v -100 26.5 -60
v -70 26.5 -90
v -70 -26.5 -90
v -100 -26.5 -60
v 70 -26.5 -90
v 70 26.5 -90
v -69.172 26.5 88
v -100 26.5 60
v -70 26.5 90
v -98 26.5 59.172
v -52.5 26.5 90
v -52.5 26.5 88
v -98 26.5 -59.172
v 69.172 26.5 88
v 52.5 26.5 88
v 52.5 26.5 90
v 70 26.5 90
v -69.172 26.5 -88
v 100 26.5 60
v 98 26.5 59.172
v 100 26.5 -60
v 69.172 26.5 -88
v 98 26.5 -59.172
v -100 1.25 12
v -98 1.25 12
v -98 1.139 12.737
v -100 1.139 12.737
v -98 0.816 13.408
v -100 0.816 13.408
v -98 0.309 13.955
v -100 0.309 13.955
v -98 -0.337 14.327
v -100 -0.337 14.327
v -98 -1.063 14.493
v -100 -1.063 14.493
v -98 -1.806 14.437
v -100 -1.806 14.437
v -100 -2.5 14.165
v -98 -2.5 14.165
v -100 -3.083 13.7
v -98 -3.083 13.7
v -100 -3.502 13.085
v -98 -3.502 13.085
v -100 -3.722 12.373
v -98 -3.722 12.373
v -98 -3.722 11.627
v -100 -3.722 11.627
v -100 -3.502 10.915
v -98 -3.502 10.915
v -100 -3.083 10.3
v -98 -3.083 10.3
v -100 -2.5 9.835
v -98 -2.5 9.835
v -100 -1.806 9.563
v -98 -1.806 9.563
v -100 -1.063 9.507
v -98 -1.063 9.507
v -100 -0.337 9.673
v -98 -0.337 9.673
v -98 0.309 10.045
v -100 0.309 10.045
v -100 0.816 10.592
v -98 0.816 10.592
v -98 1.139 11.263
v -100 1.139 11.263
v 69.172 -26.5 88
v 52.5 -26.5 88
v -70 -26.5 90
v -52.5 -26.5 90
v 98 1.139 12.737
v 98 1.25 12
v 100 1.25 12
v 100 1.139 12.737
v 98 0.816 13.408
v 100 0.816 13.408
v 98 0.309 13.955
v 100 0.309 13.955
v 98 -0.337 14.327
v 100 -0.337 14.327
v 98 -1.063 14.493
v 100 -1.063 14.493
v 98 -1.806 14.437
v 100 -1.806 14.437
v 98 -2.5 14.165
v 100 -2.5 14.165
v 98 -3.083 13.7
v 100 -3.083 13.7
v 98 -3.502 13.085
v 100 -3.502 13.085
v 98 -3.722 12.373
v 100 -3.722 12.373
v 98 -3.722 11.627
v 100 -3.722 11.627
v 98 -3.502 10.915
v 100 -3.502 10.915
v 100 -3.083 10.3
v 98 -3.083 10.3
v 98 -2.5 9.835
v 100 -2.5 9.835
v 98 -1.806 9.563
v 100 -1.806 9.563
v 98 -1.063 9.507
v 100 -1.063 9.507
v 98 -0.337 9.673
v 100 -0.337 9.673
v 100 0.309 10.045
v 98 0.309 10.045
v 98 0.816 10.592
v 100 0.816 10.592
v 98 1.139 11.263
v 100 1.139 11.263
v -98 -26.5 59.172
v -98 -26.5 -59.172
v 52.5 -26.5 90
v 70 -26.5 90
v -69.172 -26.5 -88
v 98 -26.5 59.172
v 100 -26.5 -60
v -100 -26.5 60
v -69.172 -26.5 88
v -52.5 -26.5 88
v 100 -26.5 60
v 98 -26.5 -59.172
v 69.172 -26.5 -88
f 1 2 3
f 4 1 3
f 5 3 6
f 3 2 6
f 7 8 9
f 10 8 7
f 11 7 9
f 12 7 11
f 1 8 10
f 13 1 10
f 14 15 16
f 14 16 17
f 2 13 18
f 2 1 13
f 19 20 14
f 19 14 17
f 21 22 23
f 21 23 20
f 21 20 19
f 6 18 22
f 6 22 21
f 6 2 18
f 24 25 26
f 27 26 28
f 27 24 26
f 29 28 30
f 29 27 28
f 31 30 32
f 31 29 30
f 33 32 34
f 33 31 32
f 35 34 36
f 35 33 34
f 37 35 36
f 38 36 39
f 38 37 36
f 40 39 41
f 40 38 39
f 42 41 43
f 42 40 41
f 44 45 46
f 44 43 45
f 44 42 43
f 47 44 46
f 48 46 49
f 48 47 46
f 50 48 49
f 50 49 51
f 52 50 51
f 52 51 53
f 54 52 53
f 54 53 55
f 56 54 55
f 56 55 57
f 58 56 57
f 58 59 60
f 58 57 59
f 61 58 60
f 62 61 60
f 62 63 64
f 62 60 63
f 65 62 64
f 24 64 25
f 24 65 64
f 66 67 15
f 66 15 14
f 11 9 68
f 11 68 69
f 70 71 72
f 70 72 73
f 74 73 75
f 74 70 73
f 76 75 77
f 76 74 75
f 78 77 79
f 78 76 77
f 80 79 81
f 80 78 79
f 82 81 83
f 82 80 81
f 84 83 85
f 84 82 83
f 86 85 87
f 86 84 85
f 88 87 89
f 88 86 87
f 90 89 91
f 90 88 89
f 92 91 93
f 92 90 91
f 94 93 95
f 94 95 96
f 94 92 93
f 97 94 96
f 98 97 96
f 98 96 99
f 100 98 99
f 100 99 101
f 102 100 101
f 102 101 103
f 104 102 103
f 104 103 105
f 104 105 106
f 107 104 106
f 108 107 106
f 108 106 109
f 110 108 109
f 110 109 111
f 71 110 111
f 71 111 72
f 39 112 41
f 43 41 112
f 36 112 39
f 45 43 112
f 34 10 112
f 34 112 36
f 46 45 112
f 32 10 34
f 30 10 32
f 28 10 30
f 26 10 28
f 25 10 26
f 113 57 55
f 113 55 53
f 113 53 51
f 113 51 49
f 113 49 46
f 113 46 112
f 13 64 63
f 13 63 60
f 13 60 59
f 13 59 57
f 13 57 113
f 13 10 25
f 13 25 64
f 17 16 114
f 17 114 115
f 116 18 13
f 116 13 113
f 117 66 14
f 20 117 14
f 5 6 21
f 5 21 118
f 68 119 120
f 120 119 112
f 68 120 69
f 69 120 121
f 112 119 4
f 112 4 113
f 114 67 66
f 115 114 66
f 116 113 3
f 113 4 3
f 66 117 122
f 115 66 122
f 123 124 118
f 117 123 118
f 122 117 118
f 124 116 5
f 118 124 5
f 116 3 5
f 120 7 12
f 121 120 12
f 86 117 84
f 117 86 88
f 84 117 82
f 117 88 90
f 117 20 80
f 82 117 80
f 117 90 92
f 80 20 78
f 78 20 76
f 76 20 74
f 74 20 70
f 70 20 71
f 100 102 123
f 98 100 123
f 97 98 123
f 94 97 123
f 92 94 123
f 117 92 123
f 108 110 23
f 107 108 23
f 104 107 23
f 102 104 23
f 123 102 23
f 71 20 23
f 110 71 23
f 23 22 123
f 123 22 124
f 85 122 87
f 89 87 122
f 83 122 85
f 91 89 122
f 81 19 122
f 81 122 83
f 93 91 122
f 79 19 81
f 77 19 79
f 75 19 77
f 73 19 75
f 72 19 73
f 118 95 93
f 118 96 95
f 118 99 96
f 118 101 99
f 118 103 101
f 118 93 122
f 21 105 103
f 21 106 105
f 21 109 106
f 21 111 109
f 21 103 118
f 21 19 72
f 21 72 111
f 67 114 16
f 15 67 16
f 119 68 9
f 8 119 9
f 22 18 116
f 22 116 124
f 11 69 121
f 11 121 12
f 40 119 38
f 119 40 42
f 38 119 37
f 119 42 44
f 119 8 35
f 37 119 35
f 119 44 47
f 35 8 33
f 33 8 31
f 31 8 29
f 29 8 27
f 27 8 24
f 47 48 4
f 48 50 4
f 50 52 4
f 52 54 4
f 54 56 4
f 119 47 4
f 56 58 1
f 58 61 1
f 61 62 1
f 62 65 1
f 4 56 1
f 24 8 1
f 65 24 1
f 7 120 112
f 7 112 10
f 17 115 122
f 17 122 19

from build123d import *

# Parameters (mm, degrees)
ESBO_O1_W                = 200
ESBO_O1_H                = 180
RESSALTO_EXTRUS_O1_DEPTH = 26.5
CHANFRO1_SIZE            = 30
CASCA1_T                 = -2
ESBO_O2_W                = 105
ESBO_O2_H                = 53
CORTE_EXTRUS_O1_DEPTH    = 2
CAVIDADE1_START          = -100
CAVIDADE1_OUTLINE_R      = 2.5
CAVIDADE1_DEPTH          = 200


# Read off the part's stored shape, not the designer's step: Cavidade1
with BuildPart() as part:
    # Esboço1 → Ressalto-extrusão1 (new, symmetric)
    with BuildSketch(Plane(origin=(0, 0, 0), x_dir=(1, 0, 0), z_dir=(0, 1, 0))):
        Rectangle(ESBO_O1_W, ESBO_O1_H)
    extrude(amount=RESSALTO_EXTRUS_O1_DEPTH, both=True)

    # Chanfro1
    chanfro1_edges = [part.edges().sort_by_distance(p)[0] for p in [
        (100, 0, 90),
        (-100, 0, 90),
        (-100, 0, -90),
        (100, 0, -90),
    ]]
    chamfer(chanfro1_edges, length=CHANFRO1_SIZE)

    # Casca1
    casca1_openings = [part.faces().sort_by_distance(p)[0] for p in [
        (0, 26.5, 0),
        (0, -26.5, 0),
    ]]
    offset(amount=CASCA1_T, openings=casca1_openings, kind=Kind.INTERSECTION)

    # Esboço2 → Corte-extrusão1 (cut)
    with BuildSketch(Plane.XY.offset(90)):
        Rectangle(ESBO_O2_W, ESBO_O2_H)
    extrude(amount=-CORTE_EXTRUS_O1_DEPTH, mode=Mode.SUBTRACT)

    # Cavidade1 outline → Cavidade1 (cut)
    with BuildSketch(Plane.YZ.offset(CAVIDADE1_START)):
        with Locations((-1.25, 12)):
            Circle(CAVIDADE1_OUTLINE_R)
    extrude(amount=CAVIDADE1_DEPTH, mode=Mode.SUBTRACT)


solid = part.part
